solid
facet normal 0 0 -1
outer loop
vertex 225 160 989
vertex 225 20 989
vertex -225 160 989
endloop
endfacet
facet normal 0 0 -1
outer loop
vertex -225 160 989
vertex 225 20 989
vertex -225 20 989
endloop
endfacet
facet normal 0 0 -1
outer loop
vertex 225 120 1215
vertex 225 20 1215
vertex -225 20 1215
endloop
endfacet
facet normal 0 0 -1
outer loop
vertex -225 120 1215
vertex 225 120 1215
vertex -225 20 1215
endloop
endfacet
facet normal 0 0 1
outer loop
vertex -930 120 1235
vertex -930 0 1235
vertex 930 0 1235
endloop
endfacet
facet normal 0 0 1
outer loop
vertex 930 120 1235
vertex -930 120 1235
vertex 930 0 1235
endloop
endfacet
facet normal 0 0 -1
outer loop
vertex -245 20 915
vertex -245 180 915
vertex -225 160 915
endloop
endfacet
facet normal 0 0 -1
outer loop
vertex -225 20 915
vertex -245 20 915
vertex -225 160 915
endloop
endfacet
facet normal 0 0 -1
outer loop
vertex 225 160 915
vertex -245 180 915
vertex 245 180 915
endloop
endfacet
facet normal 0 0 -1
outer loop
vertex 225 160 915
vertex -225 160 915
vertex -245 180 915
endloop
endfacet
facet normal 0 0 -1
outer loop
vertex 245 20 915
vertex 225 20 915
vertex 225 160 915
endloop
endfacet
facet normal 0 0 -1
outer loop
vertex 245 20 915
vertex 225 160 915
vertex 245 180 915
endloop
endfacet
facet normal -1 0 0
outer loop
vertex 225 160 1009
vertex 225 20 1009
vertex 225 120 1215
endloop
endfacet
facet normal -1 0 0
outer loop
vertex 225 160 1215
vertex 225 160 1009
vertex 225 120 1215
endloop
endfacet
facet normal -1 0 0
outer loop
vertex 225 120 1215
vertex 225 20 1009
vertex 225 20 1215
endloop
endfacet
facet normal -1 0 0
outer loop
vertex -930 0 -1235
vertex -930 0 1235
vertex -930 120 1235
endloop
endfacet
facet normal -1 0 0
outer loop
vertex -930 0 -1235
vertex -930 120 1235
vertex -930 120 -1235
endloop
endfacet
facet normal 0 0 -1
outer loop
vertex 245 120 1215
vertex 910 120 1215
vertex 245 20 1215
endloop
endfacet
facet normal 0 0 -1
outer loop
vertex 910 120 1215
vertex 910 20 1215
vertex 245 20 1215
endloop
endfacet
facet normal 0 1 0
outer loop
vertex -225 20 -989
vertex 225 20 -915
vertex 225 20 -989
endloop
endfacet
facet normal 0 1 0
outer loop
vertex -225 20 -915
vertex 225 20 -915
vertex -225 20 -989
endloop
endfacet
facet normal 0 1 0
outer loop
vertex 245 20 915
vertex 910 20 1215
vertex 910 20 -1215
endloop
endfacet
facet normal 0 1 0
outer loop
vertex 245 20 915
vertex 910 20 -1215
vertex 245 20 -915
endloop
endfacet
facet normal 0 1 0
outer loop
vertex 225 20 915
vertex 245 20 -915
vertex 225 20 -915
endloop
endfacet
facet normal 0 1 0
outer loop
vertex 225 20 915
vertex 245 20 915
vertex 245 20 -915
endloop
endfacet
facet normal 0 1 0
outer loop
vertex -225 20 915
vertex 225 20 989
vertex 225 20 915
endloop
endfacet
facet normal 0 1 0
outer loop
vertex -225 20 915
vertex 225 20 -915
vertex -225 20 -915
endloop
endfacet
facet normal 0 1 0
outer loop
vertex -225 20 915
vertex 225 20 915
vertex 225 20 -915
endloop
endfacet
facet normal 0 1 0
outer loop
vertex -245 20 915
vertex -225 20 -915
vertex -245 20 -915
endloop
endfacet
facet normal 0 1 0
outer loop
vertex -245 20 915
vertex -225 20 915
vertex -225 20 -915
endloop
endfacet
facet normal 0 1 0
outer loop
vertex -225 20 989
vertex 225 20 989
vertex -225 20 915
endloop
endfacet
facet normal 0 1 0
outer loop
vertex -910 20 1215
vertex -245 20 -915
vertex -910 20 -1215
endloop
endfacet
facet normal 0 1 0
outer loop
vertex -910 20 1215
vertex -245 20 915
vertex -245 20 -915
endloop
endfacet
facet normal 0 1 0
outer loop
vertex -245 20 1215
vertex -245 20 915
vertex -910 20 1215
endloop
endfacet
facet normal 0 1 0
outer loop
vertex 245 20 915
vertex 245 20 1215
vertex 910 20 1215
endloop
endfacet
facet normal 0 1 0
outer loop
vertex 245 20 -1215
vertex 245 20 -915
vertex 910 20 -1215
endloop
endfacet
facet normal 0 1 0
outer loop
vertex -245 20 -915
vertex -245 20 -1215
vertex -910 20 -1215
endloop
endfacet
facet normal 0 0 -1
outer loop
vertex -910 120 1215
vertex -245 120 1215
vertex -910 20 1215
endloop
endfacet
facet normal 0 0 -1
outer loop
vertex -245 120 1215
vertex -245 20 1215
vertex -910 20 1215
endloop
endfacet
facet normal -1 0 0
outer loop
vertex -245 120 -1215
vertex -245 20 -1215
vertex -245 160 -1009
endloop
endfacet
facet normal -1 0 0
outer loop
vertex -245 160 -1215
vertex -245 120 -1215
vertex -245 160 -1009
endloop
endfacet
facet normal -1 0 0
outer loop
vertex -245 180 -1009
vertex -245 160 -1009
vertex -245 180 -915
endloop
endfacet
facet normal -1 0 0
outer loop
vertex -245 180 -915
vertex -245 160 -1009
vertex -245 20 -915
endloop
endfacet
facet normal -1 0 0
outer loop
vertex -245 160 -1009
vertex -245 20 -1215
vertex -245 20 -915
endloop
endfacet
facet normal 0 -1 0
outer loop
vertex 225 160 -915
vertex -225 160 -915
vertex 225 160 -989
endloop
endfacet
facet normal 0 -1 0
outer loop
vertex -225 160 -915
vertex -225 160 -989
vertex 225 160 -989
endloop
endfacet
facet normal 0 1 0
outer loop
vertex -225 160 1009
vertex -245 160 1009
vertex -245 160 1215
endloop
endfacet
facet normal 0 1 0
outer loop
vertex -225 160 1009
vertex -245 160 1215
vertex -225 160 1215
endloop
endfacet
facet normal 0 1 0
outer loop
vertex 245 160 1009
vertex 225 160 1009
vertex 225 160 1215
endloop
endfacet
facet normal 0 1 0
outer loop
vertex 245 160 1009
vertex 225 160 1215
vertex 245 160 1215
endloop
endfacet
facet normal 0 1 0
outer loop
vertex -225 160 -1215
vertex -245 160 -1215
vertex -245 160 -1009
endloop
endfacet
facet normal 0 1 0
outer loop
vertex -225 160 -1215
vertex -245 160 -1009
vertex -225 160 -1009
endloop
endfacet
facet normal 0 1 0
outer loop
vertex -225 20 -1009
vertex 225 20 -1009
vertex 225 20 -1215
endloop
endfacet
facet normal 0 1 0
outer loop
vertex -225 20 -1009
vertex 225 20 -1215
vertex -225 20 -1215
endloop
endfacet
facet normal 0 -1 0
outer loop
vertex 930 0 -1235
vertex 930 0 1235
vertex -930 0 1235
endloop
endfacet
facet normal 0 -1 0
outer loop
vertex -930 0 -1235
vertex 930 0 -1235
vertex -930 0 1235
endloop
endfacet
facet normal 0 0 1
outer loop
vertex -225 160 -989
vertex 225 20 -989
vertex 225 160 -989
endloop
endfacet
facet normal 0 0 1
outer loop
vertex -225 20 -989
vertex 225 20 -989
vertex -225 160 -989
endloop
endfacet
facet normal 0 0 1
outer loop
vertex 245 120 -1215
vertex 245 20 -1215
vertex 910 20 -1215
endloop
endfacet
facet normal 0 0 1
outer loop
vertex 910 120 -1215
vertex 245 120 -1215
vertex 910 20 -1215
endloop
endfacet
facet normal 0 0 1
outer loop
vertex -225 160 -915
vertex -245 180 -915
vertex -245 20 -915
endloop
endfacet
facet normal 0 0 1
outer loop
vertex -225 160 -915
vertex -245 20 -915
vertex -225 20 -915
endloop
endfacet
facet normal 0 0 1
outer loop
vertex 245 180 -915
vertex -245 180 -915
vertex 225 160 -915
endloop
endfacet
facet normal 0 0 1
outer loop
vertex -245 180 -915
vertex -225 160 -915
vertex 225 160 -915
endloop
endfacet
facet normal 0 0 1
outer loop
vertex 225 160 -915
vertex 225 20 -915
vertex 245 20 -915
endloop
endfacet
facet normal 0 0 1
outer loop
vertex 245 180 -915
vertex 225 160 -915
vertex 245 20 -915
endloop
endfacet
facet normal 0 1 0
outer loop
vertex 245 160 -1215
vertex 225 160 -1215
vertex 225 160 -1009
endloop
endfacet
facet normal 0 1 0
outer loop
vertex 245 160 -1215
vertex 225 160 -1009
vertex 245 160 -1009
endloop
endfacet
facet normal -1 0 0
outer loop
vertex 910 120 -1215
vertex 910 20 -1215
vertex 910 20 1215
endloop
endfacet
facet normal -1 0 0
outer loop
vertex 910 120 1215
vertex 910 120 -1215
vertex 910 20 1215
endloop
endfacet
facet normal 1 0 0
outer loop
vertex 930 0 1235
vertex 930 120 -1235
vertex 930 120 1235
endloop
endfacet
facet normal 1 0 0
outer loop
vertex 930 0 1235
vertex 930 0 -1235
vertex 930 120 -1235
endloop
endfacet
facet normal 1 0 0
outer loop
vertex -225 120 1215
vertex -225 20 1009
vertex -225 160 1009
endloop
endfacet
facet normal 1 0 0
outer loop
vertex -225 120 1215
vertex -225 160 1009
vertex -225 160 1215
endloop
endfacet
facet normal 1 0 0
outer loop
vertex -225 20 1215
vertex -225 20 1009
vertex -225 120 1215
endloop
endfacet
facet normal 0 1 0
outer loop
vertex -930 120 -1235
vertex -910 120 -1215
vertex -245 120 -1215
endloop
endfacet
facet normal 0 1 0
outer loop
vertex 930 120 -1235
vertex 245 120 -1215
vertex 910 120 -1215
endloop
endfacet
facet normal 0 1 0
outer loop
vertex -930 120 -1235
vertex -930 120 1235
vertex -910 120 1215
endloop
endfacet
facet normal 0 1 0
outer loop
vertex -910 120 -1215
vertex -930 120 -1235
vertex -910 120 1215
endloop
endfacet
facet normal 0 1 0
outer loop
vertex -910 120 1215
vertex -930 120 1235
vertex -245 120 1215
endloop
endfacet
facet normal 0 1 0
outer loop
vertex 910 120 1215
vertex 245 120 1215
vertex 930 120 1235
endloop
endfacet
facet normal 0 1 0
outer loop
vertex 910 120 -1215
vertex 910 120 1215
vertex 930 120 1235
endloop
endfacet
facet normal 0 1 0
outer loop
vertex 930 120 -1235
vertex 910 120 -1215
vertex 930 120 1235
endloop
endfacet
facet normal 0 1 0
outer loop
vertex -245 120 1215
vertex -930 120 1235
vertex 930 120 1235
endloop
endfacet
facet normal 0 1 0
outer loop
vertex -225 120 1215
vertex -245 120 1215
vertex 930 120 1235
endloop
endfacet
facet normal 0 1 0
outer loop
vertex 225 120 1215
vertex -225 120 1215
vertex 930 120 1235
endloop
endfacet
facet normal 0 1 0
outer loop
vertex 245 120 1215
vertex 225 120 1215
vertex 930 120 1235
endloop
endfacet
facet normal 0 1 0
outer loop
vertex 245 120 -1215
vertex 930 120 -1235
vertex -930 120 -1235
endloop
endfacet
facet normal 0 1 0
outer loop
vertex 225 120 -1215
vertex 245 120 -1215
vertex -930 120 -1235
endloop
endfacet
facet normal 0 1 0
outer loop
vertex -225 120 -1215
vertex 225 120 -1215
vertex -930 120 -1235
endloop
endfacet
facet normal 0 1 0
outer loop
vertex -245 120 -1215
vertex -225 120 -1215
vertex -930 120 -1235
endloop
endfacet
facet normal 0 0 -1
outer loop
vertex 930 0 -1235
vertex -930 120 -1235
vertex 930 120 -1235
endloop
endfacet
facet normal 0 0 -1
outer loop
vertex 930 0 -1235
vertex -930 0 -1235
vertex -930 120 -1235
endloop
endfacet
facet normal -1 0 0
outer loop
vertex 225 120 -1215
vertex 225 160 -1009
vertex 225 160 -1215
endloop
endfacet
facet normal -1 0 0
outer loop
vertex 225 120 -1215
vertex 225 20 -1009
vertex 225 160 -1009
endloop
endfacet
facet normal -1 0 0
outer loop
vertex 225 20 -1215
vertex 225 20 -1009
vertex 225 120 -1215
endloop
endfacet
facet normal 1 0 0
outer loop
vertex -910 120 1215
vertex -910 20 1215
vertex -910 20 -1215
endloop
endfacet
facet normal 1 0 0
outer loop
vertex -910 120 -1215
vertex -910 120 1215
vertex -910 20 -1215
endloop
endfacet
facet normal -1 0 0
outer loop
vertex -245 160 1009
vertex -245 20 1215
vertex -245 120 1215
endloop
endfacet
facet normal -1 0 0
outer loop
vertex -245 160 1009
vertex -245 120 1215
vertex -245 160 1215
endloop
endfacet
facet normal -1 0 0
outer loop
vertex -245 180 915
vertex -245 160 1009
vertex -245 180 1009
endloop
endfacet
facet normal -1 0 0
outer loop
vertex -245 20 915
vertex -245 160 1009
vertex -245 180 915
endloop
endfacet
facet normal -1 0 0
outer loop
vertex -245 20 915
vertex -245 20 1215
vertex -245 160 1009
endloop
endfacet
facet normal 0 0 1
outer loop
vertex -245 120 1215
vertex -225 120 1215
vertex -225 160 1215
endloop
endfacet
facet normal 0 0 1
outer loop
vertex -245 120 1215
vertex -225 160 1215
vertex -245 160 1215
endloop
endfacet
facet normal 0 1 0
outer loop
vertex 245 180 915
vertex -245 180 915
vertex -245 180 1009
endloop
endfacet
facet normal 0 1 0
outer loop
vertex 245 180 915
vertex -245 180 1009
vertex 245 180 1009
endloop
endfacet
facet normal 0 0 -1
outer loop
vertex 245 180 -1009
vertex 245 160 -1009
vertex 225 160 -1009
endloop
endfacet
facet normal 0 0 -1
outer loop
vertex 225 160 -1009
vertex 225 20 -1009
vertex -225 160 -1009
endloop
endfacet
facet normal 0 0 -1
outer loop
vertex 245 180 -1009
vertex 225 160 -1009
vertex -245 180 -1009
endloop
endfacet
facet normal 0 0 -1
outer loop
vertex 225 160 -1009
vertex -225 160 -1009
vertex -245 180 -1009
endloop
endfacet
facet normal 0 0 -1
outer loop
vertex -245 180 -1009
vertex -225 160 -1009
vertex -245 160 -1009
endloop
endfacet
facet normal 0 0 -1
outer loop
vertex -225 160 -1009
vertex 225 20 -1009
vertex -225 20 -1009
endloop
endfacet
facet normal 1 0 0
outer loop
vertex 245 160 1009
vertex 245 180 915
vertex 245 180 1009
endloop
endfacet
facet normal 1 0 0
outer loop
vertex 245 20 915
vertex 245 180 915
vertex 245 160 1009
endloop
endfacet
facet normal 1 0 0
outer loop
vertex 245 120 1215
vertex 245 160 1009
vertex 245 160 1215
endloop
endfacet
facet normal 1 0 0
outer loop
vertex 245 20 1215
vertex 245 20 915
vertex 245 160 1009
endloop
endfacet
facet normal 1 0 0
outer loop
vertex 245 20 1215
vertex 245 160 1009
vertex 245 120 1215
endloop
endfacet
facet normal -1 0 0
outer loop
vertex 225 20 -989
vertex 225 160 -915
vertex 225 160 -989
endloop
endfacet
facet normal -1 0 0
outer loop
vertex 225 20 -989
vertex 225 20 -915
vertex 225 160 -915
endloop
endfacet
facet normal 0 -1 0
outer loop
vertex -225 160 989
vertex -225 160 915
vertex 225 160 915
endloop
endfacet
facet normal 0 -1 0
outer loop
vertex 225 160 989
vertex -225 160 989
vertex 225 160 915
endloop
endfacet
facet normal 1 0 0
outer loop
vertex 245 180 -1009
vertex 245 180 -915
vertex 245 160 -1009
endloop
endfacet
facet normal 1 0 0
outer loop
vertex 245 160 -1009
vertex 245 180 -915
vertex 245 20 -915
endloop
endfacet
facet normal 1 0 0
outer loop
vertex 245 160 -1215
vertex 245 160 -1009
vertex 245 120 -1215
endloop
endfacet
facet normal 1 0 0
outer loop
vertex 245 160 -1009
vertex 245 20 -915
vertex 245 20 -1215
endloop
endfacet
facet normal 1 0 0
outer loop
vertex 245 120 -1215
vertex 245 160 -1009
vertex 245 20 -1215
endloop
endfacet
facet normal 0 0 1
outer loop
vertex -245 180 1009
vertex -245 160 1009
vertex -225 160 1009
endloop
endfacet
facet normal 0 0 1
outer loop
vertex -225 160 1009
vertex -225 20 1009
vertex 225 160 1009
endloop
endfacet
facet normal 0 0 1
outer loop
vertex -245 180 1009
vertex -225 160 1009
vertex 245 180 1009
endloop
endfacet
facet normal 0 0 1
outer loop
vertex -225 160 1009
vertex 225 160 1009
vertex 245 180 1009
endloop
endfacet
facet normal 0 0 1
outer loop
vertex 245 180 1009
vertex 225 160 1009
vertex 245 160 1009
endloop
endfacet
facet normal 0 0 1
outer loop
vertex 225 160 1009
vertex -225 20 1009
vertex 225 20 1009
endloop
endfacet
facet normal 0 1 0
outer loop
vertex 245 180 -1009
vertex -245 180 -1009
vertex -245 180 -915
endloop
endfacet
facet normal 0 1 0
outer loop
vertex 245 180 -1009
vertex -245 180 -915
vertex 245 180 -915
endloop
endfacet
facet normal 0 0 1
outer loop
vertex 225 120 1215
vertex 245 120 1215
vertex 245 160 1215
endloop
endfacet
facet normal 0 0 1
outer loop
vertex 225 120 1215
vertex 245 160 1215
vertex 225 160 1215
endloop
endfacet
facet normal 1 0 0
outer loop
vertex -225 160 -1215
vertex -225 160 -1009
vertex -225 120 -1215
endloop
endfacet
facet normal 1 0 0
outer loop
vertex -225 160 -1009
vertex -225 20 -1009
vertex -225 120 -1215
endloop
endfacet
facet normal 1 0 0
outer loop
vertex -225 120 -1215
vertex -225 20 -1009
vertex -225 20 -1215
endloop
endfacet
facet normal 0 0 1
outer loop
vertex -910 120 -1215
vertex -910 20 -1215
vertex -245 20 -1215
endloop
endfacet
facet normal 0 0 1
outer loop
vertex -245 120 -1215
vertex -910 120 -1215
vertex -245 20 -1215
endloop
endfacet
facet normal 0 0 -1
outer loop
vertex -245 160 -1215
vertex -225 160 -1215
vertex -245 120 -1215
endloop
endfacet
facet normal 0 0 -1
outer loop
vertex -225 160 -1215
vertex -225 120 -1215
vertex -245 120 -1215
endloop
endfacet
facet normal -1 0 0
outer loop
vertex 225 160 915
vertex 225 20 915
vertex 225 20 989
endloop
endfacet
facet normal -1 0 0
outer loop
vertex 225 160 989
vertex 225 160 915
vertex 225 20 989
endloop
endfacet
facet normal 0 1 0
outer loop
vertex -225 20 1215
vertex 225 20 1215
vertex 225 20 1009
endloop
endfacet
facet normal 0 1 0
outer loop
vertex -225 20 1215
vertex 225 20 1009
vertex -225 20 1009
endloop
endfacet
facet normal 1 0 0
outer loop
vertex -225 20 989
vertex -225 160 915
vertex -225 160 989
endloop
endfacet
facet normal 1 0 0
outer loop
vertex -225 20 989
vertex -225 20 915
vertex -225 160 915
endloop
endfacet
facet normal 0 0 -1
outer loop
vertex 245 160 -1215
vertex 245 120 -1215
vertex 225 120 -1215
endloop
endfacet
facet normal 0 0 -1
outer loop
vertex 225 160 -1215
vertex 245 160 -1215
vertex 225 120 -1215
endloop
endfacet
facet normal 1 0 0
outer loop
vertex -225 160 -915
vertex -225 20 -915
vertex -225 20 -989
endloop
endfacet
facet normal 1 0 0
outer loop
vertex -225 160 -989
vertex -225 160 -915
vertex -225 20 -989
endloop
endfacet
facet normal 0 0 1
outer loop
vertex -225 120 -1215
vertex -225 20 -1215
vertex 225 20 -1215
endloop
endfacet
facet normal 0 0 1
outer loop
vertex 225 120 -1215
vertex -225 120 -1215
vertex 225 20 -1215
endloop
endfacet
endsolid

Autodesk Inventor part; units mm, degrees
ref_plane "YZ Plane" through (0, 0, 0) normal (1, 0, 0) x (0, 1, 0)
ref_plane "XZ Plane" through (0, 0, 0) normal (0, 1, 0) x (-1, 0, 0)
ref_plane "XY Plane" through (0, 0, 0) normal (0, 0, 1) x (1, 0, 0)
sketch "Sketch1" plane through (0, 0, 0) normal (0, 1, 0) x (-1, 0, 0)
  line L0 (-910, 1215) -> (910, 1215)
  line L1 (910, 1215) -> (910, -1215)
  line L2 (910, -1215) -> (-910, -1215)
  line L3 (-910, -1215) -> (-910, 1215)
  line L4 (-910, 1215) -> (910, -1215) construction
  line L5 (910, 1215) -> (-910, -1215) construction
  point P0 (0, 0)
  dimension "d0" = 1820
  dimension "d1" = 2430
extrude "Extrusion1" add sketch "Sketch1" along normal blind 20
sketch "Sketch2" plane through (0, 20, 0) normal (0, 1, 0) x (1, 0, 0)
  point P0 (0, 0)
sketch "Sketch3" plane through (0, 0, 0) normal (0, -1, 0) x (1, 0, 0)
  line L0 (910, 1215) -> (-910, 1215) projected
  line L1 (-910, 1215) -> (-910, -1215) projected
  line L2 (-910, -1215) -> (910, -1215) projected
  line L3 (910, -1215) -> (910, 1215) projected
  line L4 (910, 1215) -> (910, 1235)
  line L5 (910, 1235) -> (930, 1235)
  line L6 (-910, -1215) -> (-930, -1215)
  line L7 (-930, -1215) -> (-930, -1235)
  line L8 (-930, -1235) -> (930, -1235)
  line L9 (930, -1235) -> (930, 1235)
  line L10 (930, 1235) -> (-930, 1235)
  line L11 (-930, 1235) -> (-930, -1235)
  point P0 (0, 0)
  dimension "d4" = 20
  dimension "d5" = 20
  dimension "d6" = 20
  dimension "d7" = 20
extrude "Extrusion2" add sketch "Sketch3" against normal blind 120 contours L4 L5 L9 L8 L7 L6 L2 L3 | L0 L1 L6 L11 L10 L4
sketch "Sketch6" plane through (0, 20, 0) normal (0, 1, 0) x (1, 0, 0)
  line L0 (910, -1215) -> (-910, -1215) projected
  line L1 (225, -915) -> (245, -915)
  line L2 (245, -915) -> (245, -1215)
  line L3 (225, -915) -> (225, -989)
  line L4 (225, -989) -> (-225, -989)
  line L5 (-225, -1215) -> (-245, -1215)
  line L6 (-245, -1215) -> (-245, -915)
  line L7 (-245, -915) -> (-225, -915)
  line L8 (-225, -915) -> (-225, -989)
  line L9 (-225, -1009) -> (225, -1009)
  line L10 (225, -1009) -> (225, -1215)
  line L11 (-225, -1009) -> (-225, -1215)
  line L12 (245, -1215) -> (225, -1215)
  line L13 (225, 915) -> (245, 915)
  line L14 (245, 915) -> (245, 1215)
  line L15 (225, 915) -> (225, 989)
  line L16 (225, 989) -> (-225, 989)
  line L17 (-225, 1215) -> (-245, 1215)
  line L18 (-245, 1215) -> (-245, 915)
  line L19 (-245, 915) -> (-225, 915)
  line L20 (-225, 915) -> (-225, 989)
  line L21 (-225, 1009) -> (225, 1009)
  line L22 (225, 1009) -> (225, 1215)
  line L23 (-225, 1009) -> (-225, 1215)
  line L24 (245, 1215) -> (225, 1215)
  point P0 (0, 0)
  dimension "d22" = 20
  dimension "d23" = 74
  dimension "d24" = 450
  dimension "d25" = 20
  dimension "d26" = 20
extrude "Extrusion3" add sketch "Sketch6" along normal blind 140 contours L0 L10 L9 L11 L6 L7 L8 L4 L3 L1 L2 | L15 L16 L20 L19 L18 L17 L23 L21 L22 L24 L14 L13
sketch "Sketch7" plane through (0, 160, 0) normal (0, 1, 0) x (1, 0, 0)
  line L0 (225, -915) -> (225, -989) projected
  line L1 (225, -989) -> (-225, -989) projected
  line L2 (-225, -989) -> (-225, -915) projected
  line L3 (-225, -915) -> (-245, -915) projected
  line L4 (-245, -915) -> (-245, -1215) projected
  line L5 (-245, -1215) -> (-225, -1215) projected
  line L6 (-225, -1215) -> (-225, -1009) projected
  line L7 (-225, -1009) -> (225, -1009) projected
  line L8 (225, -1009) -> (225, -1215) projected
  line L9 (225, -1215) -> (245, -1215) projected
  line L10 (245, -1215) -> (245, -915) projected
  line L11 (245, -915) -> (225, -915) projected
  line L12 (-225, 989) -> (225, 989) projected
  line L13 (225, 989) -> (225, 915) projected
  line L14 (225, 915) -> (245, 915) projected
  line L15 (245, 915) -> (245, 1215) projected
  line L16 (245, 1215) -> (225, 1215) projected
  line L17 (225, 1215) -> (225, 1009) projected
  line L18 (225, 1009) -> (-225, 1009) projected
  line L19 (-225, 1009) -> (-225, 1215) projected
  line L20 (-225, 1215) -> (-245, 1215) projected
  line L21 (-245, 1215) -> (-245, 915) projected
  line L22 (-245, 915) -> (-225, 915) projected
  line L23 (-225, 915) -> (-225, 989) projected
  line L24 (245, -1215) -> (245, -915) projected
  line L25 (-245, -915) -> (245, -915)
  line L26 (245, -915) -> (245, -1009)
  line L27 (245, -1009) -> (-245, -1009)
  line L28 (-245, -1009) -> (-245, -915)
  line L29 (245, 915) -> (245, 1215) projected
  line L30 (245, 1009) -> (-245, 1009)
  line L31 (-245, 1009) -> (-245, 915)
  line L32 (-245, 915) -> (245, 915)
  line L33 (245, 915) -> (245, 1009)
  point P0 (0, 0)
extrude "Extrusion4" add sketch "Sketch7" along normal blind 20 contours L11 L10 L27 L7 L4 L3 L2 L1 L0 | L0 L1 L2 L25 | L23 L22 L21 L30 L18 L15 L14 L13 L12 | L12 L13 L32 L23
properties part number "Field"
